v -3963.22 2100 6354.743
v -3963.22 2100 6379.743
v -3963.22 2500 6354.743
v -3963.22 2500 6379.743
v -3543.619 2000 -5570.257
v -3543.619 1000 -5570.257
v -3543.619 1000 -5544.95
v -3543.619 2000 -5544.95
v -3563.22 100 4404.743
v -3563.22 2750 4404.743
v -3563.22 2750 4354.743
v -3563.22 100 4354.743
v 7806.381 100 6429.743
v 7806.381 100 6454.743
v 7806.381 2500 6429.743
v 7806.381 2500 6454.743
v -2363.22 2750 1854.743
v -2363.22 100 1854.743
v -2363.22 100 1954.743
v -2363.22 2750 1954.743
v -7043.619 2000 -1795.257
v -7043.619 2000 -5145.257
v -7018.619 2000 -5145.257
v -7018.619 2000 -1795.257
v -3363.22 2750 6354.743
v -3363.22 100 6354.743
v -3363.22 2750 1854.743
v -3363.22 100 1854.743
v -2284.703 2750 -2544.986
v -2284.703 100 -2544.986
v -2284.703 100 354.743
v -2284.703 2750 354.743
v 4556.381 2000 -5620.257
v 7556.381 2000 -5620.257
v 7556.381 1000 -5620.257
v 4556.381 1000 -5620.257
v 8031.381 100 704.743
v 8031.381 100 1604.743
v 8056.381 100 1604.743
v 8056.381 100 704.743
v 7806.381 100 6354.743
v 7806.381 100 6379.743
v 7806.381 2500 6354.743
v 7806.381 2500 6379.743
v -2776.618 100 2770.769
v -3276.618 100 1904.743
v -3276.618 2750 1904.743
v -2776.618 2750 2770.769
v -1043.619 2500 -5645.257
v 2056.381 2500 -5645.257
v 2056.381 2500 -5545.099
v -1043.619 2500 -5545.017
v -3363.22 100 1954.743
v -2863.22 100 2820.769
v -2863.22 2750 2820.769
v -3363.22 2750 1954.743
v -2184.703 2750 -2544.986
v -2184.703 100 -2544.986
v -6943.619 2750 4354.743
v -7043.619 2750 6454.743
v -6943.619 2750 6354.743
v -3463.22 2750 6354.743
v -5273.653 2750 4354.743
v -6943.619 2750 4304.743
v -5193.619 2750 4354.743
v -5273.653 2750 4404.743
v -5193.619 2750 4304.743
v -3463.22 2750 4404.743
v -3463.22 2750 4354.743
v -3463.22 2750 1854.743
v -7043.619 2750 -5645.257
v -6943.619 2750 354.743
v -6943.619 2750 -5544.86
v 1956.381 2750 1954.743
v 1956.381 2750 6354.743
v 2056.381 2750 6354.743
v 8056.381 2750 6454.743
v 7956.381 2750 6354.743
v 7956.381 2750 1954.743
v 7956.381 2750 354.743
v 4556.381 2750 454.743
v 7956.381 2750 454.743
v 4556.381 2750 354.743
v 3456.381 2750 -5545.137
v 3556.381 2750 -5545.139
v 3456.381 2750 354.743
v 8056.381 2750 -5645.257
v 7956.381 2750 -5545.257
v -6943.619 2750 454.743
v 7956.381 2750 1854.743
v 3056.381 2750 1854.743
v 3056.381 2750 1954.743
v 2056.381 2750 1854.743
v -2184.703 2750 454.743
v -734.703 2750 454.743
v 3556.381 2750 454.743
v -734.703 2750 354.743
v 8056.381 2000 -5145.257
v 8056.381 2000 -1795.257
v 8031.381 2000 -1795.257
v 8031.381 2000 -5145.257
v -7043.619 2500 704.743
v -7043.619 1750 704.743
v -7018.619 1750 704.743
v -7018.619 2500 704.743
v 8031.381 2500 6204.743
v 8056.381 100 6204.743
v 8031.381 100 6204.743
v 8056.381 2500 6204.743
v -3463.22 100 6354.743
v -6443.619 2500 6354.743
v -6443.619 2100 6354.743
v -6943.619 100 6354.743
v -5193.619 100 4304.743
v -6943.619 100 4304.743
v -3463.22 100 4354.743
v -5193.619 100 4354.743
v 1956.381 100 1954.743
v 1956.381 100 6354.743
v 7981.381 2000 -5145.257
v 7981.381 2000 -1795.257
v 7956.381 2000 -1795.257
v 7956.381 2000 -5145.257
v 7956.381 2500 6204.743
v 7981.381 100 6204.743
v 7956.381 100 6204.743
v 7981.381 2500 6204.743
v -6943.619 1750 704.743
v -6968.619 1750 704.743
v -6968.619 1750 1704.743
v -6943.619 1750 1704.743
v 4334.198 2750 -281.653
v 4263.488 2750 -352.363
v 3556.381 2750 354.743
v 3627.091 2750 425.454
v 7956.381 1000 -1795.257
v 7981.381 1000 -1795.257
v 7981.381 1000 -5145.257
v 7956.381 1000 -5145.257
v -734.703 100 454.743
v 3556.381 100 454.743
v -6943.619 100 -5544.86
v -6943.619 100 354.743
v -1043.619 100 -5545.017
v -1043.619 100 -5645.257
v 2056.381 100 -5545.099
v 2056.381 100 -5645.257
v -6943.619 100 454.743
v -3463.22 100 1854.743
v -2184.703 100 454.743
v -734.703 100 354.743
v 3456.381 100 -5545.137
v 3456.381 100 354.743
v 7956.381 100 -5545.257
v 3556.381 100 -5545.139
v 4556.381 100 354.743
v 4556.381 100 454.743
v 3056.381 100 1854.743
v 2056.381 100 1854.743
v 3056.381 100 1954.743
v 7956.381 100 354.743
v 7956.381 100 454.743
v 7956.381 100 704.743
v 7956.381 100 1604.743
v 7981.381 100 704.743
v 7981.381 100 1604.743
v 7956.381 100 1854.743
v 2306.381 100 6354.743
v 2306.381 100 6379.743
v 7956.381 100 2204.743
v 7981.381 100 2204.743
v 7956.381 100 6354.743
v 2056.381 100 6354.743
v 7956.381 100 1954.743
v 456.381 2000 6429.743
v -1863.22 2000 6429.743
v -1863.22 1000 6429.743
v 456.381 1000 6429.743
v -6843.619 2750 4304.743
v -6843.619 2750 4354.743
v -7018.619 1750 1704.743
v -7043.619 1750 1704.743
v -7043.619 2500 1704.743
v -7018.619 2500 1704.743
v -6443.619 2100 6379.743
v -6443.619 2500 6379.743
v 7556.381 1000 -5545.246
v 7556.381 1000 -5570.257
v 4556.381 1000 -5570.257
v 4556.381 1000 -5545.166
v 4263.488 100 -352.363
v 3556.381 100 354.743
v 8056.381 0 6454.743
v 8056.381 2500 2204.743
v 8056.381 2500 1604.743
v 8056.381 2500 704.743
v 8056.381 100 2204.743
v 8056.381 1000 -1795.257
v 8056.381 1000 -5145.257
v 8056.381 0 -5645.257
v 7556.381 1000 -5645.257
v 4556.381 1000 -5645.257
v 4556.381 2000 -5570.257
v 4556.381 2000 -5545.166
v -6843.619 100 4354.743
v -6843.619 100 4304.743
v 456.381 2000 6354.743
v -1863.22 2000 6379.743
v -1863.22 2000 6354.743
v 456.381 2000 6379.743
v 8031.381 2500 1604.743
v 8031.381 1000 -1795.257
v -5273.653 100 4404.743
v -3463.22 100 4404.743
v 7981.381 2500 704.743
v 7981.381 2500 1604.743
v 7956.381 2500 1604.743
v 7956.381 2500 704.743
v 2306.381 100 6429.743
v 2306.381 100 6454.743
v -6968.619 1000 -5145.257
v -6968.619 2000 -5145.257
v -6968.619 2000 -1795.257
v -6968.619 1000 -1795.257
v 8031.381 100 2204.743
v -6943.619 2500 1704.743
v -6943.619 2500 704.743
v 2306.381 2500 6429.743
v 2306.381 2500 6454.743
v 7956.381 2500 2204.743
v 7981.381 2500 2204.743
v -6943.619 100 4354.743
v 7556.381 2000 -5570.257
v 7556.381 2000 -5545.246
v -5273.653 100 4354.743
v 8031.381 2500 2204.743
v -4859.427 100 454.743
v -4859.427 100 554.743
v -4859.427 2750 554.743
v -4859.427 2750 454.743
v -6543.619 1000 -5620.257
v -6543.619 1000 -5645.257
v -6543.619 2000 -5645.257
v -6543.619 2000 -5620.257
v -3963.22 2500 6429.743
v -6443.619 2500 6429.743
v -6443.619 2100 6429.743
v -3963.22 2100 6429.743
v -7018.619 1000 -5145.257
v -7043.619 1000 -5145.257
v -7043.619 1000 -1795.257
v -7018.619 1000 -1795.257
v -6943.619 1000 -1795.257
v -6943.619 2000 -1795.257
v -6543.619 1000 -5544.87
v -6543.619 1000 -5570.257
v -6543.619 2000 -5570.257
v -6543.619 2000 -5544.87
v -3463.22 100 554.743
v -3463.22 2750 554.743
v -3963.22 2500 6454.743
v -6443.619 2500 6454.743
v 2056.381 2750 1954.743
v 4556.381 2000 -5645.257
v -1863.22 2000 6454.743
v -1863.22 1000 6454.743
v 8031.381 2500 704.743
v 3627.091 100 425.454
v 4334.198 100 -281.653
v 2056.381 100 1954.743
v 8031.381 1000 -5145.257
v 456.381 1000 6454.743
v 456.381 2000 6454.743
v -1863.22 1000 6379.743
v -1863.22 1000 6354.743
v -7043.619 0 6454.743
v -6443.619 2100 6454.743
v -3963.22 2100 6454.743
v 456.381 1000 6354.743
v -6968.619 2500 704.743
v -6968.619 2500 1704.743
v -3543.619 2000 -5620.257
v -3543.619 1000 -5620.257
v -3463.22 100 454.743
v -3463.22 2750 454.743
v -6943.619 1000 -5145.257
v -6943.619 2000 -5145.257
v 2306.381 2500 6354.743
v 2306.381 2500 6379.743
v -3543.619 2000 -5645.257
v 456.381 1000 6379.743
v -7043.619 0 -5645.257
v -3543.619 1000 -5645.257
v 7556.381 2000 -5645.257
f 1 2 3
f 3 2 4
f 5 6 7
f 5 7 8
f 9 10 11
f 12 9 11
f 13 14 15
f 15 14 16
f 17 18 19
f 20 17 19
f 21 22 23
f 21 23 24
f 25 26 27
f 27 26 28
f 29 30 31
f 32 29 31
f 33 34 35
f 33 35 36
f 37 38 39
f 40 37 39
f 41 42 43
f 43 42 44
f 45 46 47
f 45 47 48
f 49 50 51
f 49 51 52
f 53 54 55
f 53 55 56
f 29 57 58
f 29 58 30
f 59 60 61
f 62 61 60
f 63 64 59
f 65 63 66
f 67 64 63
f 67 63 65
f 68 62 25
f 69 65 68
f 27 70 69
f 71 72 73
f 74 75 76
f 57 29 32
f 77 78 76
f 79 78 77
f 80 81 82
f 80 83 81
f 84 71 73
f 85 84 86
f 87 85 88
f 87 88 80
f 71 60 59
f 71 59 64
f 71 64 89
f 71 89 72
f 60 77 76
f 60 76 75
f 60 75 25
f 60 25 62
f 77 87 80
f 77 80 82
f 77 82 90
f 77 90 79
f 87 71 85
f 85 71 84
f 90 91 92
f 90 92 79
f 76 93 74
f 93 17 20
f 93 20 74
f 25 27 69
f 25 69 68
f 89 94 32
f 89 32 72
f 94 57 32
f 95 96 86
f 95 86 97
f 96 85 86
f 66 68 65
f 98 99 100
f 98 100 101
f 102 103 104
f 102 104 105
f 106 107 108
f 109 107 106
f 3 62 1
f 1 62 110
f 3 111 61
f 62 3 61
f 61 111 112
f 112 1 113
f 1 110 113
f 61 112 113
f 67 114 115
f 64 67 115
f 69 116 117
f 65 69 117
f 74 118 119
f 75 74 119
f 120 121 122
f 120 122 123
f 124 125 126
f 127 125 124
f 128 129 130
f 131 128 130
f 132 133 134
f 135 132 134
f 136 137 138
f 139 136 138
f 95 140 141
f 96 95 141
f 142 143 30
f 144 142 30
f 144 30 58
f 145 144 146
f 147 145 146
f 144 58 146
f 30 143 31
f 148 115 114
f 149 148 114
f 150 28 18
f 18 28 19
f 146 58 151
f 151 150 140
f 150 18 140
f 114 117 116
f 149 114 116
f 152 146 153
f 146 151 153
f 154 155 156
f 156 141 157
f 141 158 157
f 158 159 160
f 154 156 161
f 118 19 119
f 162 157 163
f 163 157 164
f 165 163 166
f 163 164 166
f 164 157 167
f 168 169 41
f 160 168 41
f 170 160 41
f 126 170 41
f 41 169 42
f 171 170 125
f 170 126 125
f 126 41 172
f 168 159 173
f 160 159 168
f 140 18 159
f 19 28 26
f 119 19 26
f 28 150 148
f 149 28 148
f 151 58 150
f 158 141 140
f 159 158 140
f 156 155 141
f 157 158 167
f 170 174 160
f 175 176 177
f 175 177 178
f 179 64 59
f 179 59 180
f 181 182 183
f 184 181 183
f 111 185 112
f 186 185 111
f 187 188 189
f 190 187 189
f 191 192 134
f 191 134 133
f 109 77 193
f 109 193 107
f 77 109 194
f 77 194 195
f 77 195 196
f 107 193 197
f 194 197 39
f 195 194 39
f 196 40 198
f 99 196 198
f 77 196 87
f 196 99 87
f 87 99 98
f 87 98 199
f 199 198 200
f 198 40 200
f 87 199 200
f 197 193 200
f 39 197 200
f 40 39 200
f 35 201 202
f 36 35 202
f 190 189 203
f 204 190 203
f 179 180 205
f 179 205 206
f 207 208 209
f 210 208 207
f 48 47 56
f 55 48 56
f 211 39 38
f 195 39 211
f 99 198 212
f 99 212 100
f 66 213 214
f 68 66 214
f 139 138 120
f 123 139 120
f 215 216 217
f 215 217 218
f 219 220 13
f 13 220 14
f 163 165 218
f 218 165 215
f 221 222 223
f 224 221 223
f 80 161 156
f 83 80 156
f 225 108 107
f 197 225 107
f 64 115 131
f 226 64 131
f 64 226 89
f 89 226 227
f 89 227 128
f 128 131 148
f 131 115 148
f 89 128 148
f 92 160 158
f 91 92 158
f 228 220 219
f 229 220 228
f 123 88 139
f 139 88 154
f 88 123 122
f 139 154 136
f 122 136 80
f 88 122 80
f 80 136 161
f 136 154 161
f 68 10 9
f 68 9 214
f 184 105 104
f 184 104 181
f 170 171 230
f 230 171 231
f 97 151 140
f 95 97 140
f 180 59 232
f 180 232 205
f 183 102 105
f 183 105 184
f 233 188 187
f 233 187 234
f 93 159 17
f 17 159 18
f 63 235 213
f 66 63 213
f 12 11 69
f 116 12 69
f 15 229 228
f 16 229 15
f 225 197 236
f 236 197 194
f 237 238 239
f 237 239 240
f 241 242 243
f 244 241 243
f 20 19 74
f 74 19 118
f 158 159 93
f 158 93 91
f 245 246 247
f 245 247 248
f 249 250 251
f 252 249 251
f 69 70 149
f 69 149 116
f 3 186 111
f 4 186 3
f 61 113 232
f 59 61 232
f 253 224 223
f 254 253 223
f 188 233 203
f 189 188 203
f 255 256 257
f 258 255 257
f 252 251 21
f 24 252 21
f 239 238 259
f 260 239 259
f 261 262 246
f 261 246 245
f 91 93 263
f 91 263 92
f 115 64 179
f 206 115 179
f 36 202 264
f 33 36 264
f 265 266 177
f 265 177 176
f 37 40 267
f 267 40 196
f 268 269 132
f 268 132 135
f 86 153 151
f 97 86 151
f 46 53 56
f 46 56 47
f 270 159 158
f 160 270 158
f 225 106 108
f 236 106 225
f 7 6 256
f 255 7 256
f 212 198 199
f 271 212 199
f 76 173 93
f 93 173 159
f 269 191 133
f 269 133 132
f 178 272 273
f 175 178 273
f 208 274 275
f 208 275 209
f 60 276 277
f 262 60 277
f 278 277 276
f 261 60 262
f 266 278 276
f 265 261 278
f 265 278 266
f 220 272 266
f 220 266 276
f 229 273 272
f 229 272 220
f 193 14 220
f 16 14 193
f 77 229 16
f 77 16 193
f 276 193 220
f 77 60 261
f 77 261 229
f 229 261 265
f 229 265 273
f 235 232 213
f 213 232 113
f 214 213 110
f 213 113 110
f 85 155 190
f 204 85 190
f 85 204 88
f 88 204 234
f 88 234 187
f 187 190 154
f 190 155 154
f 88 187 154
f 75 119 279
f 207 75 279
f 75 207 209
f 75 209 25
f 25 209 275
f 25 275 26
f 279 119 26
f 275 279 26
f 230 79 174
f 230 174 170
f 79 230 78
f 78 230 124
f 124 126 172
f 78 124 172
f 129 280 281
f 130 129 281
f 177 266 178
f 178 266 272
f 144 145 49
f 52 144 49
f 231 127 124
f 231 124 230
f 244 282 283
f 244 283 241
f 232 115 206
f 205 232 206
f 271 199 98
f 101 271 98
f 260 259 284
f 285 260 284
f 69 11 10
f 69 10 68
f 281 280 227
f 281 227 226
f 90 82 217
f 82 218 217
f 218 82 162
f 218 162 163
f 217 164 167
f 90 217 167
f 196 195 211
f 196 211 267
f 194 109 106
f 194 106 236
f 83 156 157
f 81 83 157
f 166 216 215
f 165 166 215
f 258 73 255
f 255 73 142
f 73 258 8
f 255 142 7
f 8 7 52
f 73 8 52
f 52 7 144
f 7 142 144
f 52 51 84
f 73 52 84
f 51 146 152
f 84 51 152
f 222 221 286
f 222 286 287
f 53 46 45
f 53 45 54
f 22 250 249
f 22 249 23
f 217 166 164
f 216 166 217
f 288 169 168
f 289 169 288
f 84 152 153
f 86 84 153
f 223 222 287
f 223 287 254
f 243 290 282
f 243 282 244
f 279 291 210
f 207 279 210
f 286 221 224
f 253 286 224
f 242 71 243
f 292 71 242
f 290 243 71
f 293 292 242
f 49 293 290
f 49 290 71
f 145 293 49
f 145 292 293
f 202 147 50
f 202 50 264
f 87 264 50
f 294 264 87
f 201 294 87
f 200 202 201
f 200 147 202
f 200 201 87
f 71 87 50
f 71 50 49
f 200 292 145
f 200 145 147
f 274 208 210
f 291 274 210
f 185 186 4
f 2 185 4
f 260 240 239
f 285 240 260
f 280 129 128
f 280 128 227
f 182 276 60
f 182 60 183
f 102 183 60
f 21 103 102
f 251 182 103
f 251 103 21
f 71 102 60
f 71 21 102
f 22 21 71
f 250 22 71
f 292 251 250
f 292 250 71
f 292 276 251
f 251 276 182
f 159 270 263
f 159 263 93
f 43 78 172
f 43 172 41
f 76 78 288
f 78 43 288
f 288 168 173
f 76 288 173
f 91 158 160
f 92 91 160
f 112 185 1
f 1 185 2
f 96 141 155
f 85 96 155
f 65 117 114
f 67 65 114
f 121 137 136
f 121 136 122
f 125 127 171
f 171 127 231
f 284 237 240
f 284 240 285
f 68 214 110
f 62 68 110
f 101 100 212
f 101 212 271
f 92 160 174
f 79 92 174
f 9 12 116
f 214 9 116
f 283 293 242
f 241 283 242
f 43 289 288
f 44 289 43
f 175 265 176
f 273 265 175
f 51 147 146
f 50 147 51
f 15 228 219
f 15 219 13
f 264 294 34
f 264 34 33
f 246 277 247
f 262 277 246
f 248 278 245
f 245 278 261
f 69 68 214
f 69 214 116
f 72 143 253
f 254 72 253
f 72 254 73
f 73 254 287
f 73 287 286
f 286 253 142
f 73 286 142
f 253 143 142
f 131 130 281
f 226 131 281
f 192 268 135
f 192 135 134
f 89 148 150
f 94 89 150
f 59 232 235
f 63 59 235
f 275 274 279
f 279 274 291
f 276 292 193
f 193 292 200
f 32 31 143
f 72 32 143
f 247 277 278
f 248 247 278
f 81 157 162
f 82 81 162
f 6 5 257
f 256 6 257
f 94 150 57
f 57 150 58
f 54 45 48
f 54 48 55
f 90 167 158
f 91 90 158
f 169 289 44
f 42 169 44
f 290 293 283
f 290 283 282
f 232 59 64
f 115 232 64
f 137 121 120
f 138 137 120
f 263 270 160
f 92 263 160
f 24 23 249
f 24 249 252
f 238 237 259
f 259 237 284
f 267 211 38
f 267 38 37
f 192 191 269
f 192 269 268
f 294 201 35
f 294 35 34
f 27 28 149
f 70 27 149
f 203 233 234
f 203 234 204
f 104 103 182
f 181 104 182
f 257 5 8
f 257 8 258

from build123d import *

# Parameters (mm, degrees)
BOSS_EXTRUDE1_DEPTH    = 100
SKETCH1_7_W            = 15100
SKETCH1_7_H            = 12100
BOSS_EXTRUDE2_DEPTH    = 2750
SKETCH2_W              = 900
SKETCH2_H              = 2400
CUT_EXTRUDE1_DEPTH     = 100
SKETCH3_W              = 3100
SKETCH3_H              = 2400
CUT_EXTRUDE2_DEPTH     = 200
SKETCH4_W              = 3000
SKETCH4_H              = 1000
CUT_EXTRUDE3_DEPTH     = 250
SKETCH5_W              = 3000
SKETCH5_H              = 1000
CUT_EXTRUDE4_DEPTH     = 250
SKETCH6_W              = 4000
SKETCH6_H              = 2400
SKETCH6_W_2            = 3350
SKETCH6_H_2            = 1000
CUT_EXTRUDE5_DEPTH     = 250
SKETCH7_W              = 5500
SKETCH7_H              = 2400
SKETCH7_W_2            = 2319.600826821
SKETCH7_H_2            = 1000
SKETCH7_W_3            = 2480.399173179
SKETCH7_H_3            = 400
CUT_EXTRUDE6_DEPTH     = 250
SKETCH9_W              = 3350
SKETCH9_H              = 1000
SKETCH9_W_2            = 1000
SKETCH9_H_2            = 750
CUT_EXTRUDE7_DEPTH     = 250
SKETCH10_W             = 5500
SKETCH10_H             = 2400
SKETCH10_W_2           = 2319.600826821
SKETCH10_H_2           = 1000
SKETCH10_W_3           = 2480.399173179
SKETCH10_H_3           = 400
BOSS_EXTRUDE3_DEPTH    = 75
SKETCH10_3_W           = 5500
SKETCH10_3_H           = 2400
SKETCH10_3_W_2         = 2319.600826821
SKETCH10_3_H_2         = 1000
SKETCH10_3_W_3         = 2480.399173179
SKETCH10_3_H_3         = 400
CUT_EXTRUDE8_DEPTH     = 25
BOSS_EXTRUDE4_START    = -25
SKETCH11_W             = 3350
SKETCH11_H             = 1000
SKETCH11_W_2           = 4000
SKETCH11_H_2           = 2400
SKETCH11_W_3           = 900
BOSS_EXTRUDE4_DEPTH    = 50
BOSS_EXTRUDE5_START    = -25
SKETCH12_W             = 1000
SKETCH12_H             = 750
SKETCH12_W_2           = 3350
SKETCH12_H_2           = 1000
BOSS_EXTRUDE5_DEPTH    = 50
BOSS_EXTRUDE6_START    = -25
SKETCH13_W             = 3000
SKETCH13_H             = 1000
BOSS_EXTRUDE6_DEPTH    = 50
BOSS_EXTRUDE9_DEPTH    = 2650
BOSS_EXTRUDE9_2_DEPTH  = 2650
SKETCH14_W             = 1000
SKETCH14_H             = 100
BOSS_EXTRUDE9_3_DEPTH  = 2650
SKETCH14_W_2           = 1396.20651688
BOSS_EXTRUDE9_4_DEPTH  = 2650
BOSS_EXTRUDE10_DEPTH   = 2650
SKETCH16_W             = 100
SKETCH16_H             = 50
BOSS_EXTRUDE12_DEPTH   = 2650
BOSS_EXTRUDE12_2_DEPTH = 2650


with BuildPart() as part:
    # Sketch1 → Boss-Extrude1 (new body)
    with BuildSketch(Plane(origin=(0, 0, 0), x_dir=(1, 0, 0), z_dir=(0, 1, 0))):
        Polygon((7956.380744076, -1854.743434777), (7956.380744076, -454.743434777), (4556.380744076, -454.743434777), (4556.380744076, -354.743434776), (7956.380744076, -354.743434776), (7956.380744076, 5545.256565223), (3556.380744076, 5545.139320681), (3556.380744076, -454.743434776), (-734.703091916, -454.743434776), (-734.703091916, -354.743434777), (3456.380744076, -354.743434777), (3456.380744076, 5545.136656033), (-2184.783043673, 5544.986338836), (-6943.619255924, 5544.85953257), (-6943.619255924, -354.743434777), (-2284.703091916, -354.743434777), (-2284.703091916, 2544.986339901), (-2184.703104212, 2544.986339901), (-2184.703104212, -454.743434777), (-6943.619255924, -454.743434777), (-6943.619255924, -6354.743434777), (-3463.220082745, -6354.743434777), (-3463.220082745, -1854.743434777), (-3363.220082745, -1854.743434777), (-3363.220082745, -6354.743434777), (1956.380744076, -6354.743434777), (1956.380744076, -1954.743434777), (-2363.220082745, -1954.743434777), (-2363.220082745, -1854.743434777), (2056.380744076, -1854.743434777), (2056.380744076, -6354.743434777), (7956.380744076, -6354.743434777), (7956.380744076, -1954.743434777), (3056.380744076, -1954.743434777), (3056.380744076, -1854.743434777), align=None)
    extrude(amount=BOSS_EXTRUDE1_DEPTH)

    # Sketch1<7> → Boss-Extrude2 (add)
    with BuildSketch(Plane(origin=(0, 0, 0), x_dir=(1, 0, 0), z_dir=(0, 1, 0))):
        with Locations((506.380744076, -404.743434777)):
            Rectangle(SKETCH1_7_W, SKETCH1_7_H)
        Polygon((7956.380744076, -454.743434777), (7956.380744076, -1854.743434777), (3056.380744076, -1854.743434777), (3056.380744076, -1954.743434777), (7956.380744076, -1954.743434777), (7956.380744076, -6354.743434777), (2056.380744076, -6354.743434777), (2056.380744076, -1854.743434777), (-2363.220082745, -1854.743434777), (-2363.220082745, -1954.743434777), (1956.380744076, -1954.743434777), (1956.380744076, -6354.743434777), (-3363.220082745, -6354.743434777), (-3363.220082745, -1854.743434777), (-3463.220082745, -1854.743434777), (-3463.220082745, -6354.743434777), (-6943.619255924, -6354.743434777), (-6943.619255924, -454.743434777), (-2184.703104212, -454.743434777), (-2184.703104212, 2544.986339901), (-2284.703091916, 2544.986339901), (-2284.703091916, -354.743434777), (-6943.619255924, -354.743434777), (-6943.619255924, 5544.85953257), (-2184.783043673, 5544.986338836), (3456.380744076, 5545.136656033), (3456.380744076, -354.743434777), (-734.703091916, -354.743434777), (-734.703091916, -454.743434776), (3556.380744076, -454.743434776), (3556.380744076, 5545.139320681), (7956.380744076, 5545.256565223), (7956.380744076, -354.743434776), (4556.380744076, -354.743434776), (4556.380744076, -454.743434777), align=None, mode=Mode.SUBTRACT)
    extrude(amount=BOSS_EXTRUDE2_DEPTH)

    # Sketch2 → Cut-Extrude1 (cut)
    with BuildSketch(Plane(origin=(8056.380744076, 0, 0), x_dir=(0, 0, -1), z_dir=(1, 0, 0))):
        with Locations((-1154.743434777, 1300)):
            Rectangle(SKETCH2_W, SKETCH2_H)
    extrude(amount=-CUT_EXTRUDE1_DEPTH, mode=Mode.SUBTRACT)

    # Sketch3 → Cut-Extrude2 (cut)
    with BuildSketch(Plane(origin=(0, 0, -5645.256565223), x_dir=(-1, 0, 0), z_dir=(0, 0, -1))):
        with Locations((-506.380744076, 1300)):
            Rectangle(SKETCH3_W, SKETCH3_H)
    extrude(amount=-CUT_EXTRUDE2_DEPTH, mode=Mode.SUBTRACT)

    # Sketch4 → Cut-Extrude3 (cut)
    with BuildSketch(Plane(origin=(0, 0, -5645.256565223), x_dir=(-1, 0, 0), z_dir=(0, 0, -1))):
        with Locations((5043.619255924, 1500)):
            Rectangle(SKETCH4_W, SKETCH4_H)
    extrude(amount=-CUT_EXTRUDE3_DEPTH, mode=Mode.SUBTRACT)

    # Sketch5 → Cut-Extrude4 (cut)
    with BuildSketch(Plane(origin=(0, 0, -5645.256565223), x_dir=(-1, 0, 0), z_dir=(0, 0, -1))):
        with Locations((-6056.380744076, 1500)):
            Rectangle(SKETCH5_W, SKETCH5_H)
    extrude(amount=-CUT_EXTRUDE4_DEPTH, mode=Mode.SUBTRACT)

    # Sketch6 → Cut-Extrude5 (cut)
    with BuildSketch(Plane(origin=(8056.380744076, 0, 0), x_dir=(0, 0, -1), z_dir=(1, 0, 0))):
        with Locations((-4204.743434777, 1300)):
            Rectangle(SKETCH6_W, SKETCH6_H)
        with Locations((3470.256565223, 1500)):
            Rectangle(SKETCH6_W_2, SKETCH6_H_2)
    extrude(amount=-CUT_EXTRUDE5_DEPTH, mode=Mode.SUBTRACT)

    # Sketch7 → Cut-Extrude6 (cut)
    with BuildSketch(Plane.XY.offset(6454.743434777)):
        with Locations((5056.380744076, 1300)):
            Rectangle(SKETCH7_W, SKETCH7_H)
        with Locations((-703.419669334, 1500)):
            Rectangle(SKETCH7_W_2, SKETCH7_H_2)
        with Locations((-5203.419669335, 2300)):
            Rectangle(SKETCH7_W_3, SKETCH7_H_3)
    extrude(amount=-CUT_EXTRUDE6_DEPTH, mode=Mode.SUBTRACT)

    # Sketch9 → Cut-Extrude7 (cut)
    with BuildSketch(Plane.ZY.offset(7043.619255924)):
        with Locations((-3470.256565223, 1500)):
            Rectangle(SKETCH9_W, SKETCH9_H)
        with Locations((1204.743434777, 2125)):
            Rectangle(SKETCH9_W_2, SKETCH9_H_2)
    extrude(amount=-CUT_EXTRUDE7_DEPTH, mode=Mode.SUBTRACT)

    # Sketch10 → Boss-Extrude3 (add)
    with BuildSketch(Plane.XY.offset(6454.743434777)):
        with Locations((5056.380744076, 1300)):
            Rectangle(SKETCH10_W, SKETCH10_H)
        with Locations((-703.419669334, 1500)):
            Rectangle(SKETCH10_W_2, SKETCH10_H_2)
        with Locations((-5203.419669335, 2300)):
            Rectangle(SKETCH10_W_3, SKETCH10_H_3)
    extrude(amount=-BOSS_EXTRUDE3_DEPTH)

    # Sketch10<3> → Cut-Extrude8 (cut)
    with BuildSketch(Plane.XY.offset(6454.743434777)):
        with Locations((5056.380744076, 1300)):
            Rectangle(SKETCH10_3_W, SKETCH10_3_H)
        with Locations((-703.419669334, 1500)):
            Rectangle(SKETCH10_3_W_2, SKETCH10_3_H_2)
        with Locations((-5203.419669335, 2300)):
            Rectangle(SKETCH10_3_W_3, SKETCH10_3_H_3)
    extrude(amount=-CUT_EXTRUDE8_DEPTH, mode=Mode.SUBTRACT)

    # Sketch11 → Boss-Extrude4 (add)
    with BuildSketch(Plane(origin=(8056.380744076, 0, 0), x_dir=(0, 0, -1), z_dir=(1, 0, 0)).offset(BOSS_EXTRUDE4_START)):
        with Locations((3470.256565223, 1500)):
            Rectangle(SKETCH11_W, SKETCH11_H)
        with Locations((-4204.743434777, 1300)):
            Rectangle(SKETCH11_W_2, SKETCH11_H_2)
        with Locations((-1154.743434777, 1300)):
            Rectangle(SKETCH11_W_3, SKETCH11_H_2)
    extrude(amount=-BOSS_EXTRUDE4_DEPTH)

    # Sketch12 → Boss-Extrude5 (add)
    with BuildSketch(Plane.ZY.offset(7043.619255924).offset(BOSS_EXTRUDE5_START)):
        with Locations((1204.743434777, 2125)):
            Rectangle(SKETCH12_W, SKETCH12_H)
        with Locations((-3470.256565223, 1500)):
            Rectangle(SKETCH12_W_2, SKETCH12_H_2)
    extrude(amount=-BOSS_EXTRUDE5_DEPTH)

    # Sketch13 → Boss-Extrude6 (add)
    with BuildSketch(Plane(origin=(0, 0, -5645.256565223), x_dir=(-1, 0, 0), z_dir=(0, 0, -1)).offset(BOSS_EXTRUDE6_START)):
        with Locations((-6056.380744076, 1500)):
            Rectangle(SKETCH13_W, SKETCH13_H)
        with Locations((5043.619255924, 1500)):
            Rectangle(SKETCH13_W, SKETCH13_H)
    extrude(amount=-BOSS_EXTRUDE6_DEPTH)

    # Sketch15 → Boss-Extrude10 (add)
    with BuildSketch(Plane(origin=(0, 100, 0), x_dir=(1, 0, 0), z_dir=(0, 1, 0))):
        Polygon((-6943.619255924, -4354.743434777), (-5273.653015998, -4354.743434777), (-5273.653015998, -4404.743434777), (-5193.619255924, -4404.743434777), (-3463.220082745, -4404.743434777), (-3463.220082745, -4354.743434777), (-5193.619255924, -4354.743434777), (-5193.619255924, -4304.743434777), (-6943.619255924, -4304.743434777), align=None)
    extrude(amount=BOSS_EXTRUDE10_DEPTH)


with BuildPart() as body_2:
    # Sketch14 → Boss-Extrude9 (new body)
    with BuildSketch(Plane(origin=(0, 100, 0), x_dir=(1, 0, 0), z_dir=(0, 1, 0))):
        Polygon((-3363.220082745, -1954.743434777), (-3276.617542367, -1904.743434777), (-2776.617542367, -2770.768838561), (-2863.220082745, -2820.768838561), align=None)
    extrude(amount=BOSS_EXTRUDE9_DEPTH)


with BuildPart() as body_3:
    # Sketch14 → Boss-Extrude9 2 (new body)
    with BuildSketch(Plane(origin=(0, 100, 0), x_dir=(1, 0, 0), z_dir=(0, 1, 0))):
        Polygon((3627.091422195, -425.454112895), (3556.380744076, -354.743434776), (4263.487525262, 352.36334641), (4334.198203381, 281.652668291), align=None)
    extrude(amount=BOSS_EXTRUDE9_2_DEPTH)


with BuildPart() as body_4:
    # Sketch14 → Boss-Extrude9 3 (new body)
    with BuildSketch(Plane(origin=(0, 100, 0), x_dir=(1, 0, 0), z_dir=(0, 1, 0))):
        with Locations((2556.380744076, -1904.743434777)):
            Rectangle(SKETCH14_W, SKETCH14_H)
    extrude(amount=BOSS_EXTRUDE9_3_DEPTH)


with BuildPart() as body_5:
    # Sketch14 → Boss-Extrude9 4 (new body)
    with BuildSketch(Plane(origin=(0, 100, 0), x_dir=(1, 0, 0), z_dir=(0, 1, 0))):
        with Locations((-4161.323341185, -504.743434777)):
            Rectangle(SKETCH14_W_2, SKETCH14_H)
    extrude(amount=BOSS_EXTRUDE9_4_DEPTH)


with BuildPart() as body_6:
    # Sketch16 → Boss-Extrude12 (new body)
    with BuildSketch(Plane(origin=(0, 2750, 0), x_dir=(1, 0, 0), z_dir=(0, 1, 0))):
        with Locations((-6893.619255924, -4329.743434777)):
            Rectangle(SKETCH16_W, SKETCH16_H)
    extrude(amount=-BOSS_EXTRUDE12_DEPTH)


with BuildPart() as body_7:
    # Sketch16 → Boss-Extrude12 2 (new body)
    with BuildSketch(Plane(origin=(0, 2750, 0), x_dir=(1, 0, 0), z_dir=(0, 1, 0))):
        with Locations((-3513.220082745, -4379.743434777)):
            Rectangle(SKETCH16_W, SKETCH16_H)
    extrude(amount=-BOSS_EXTRUDE12_2_DEPTH)


solid = Compound([part.part, body_2.part, body_3.part, body_4.part, body_5.part, body_6.part, body_7.part])
